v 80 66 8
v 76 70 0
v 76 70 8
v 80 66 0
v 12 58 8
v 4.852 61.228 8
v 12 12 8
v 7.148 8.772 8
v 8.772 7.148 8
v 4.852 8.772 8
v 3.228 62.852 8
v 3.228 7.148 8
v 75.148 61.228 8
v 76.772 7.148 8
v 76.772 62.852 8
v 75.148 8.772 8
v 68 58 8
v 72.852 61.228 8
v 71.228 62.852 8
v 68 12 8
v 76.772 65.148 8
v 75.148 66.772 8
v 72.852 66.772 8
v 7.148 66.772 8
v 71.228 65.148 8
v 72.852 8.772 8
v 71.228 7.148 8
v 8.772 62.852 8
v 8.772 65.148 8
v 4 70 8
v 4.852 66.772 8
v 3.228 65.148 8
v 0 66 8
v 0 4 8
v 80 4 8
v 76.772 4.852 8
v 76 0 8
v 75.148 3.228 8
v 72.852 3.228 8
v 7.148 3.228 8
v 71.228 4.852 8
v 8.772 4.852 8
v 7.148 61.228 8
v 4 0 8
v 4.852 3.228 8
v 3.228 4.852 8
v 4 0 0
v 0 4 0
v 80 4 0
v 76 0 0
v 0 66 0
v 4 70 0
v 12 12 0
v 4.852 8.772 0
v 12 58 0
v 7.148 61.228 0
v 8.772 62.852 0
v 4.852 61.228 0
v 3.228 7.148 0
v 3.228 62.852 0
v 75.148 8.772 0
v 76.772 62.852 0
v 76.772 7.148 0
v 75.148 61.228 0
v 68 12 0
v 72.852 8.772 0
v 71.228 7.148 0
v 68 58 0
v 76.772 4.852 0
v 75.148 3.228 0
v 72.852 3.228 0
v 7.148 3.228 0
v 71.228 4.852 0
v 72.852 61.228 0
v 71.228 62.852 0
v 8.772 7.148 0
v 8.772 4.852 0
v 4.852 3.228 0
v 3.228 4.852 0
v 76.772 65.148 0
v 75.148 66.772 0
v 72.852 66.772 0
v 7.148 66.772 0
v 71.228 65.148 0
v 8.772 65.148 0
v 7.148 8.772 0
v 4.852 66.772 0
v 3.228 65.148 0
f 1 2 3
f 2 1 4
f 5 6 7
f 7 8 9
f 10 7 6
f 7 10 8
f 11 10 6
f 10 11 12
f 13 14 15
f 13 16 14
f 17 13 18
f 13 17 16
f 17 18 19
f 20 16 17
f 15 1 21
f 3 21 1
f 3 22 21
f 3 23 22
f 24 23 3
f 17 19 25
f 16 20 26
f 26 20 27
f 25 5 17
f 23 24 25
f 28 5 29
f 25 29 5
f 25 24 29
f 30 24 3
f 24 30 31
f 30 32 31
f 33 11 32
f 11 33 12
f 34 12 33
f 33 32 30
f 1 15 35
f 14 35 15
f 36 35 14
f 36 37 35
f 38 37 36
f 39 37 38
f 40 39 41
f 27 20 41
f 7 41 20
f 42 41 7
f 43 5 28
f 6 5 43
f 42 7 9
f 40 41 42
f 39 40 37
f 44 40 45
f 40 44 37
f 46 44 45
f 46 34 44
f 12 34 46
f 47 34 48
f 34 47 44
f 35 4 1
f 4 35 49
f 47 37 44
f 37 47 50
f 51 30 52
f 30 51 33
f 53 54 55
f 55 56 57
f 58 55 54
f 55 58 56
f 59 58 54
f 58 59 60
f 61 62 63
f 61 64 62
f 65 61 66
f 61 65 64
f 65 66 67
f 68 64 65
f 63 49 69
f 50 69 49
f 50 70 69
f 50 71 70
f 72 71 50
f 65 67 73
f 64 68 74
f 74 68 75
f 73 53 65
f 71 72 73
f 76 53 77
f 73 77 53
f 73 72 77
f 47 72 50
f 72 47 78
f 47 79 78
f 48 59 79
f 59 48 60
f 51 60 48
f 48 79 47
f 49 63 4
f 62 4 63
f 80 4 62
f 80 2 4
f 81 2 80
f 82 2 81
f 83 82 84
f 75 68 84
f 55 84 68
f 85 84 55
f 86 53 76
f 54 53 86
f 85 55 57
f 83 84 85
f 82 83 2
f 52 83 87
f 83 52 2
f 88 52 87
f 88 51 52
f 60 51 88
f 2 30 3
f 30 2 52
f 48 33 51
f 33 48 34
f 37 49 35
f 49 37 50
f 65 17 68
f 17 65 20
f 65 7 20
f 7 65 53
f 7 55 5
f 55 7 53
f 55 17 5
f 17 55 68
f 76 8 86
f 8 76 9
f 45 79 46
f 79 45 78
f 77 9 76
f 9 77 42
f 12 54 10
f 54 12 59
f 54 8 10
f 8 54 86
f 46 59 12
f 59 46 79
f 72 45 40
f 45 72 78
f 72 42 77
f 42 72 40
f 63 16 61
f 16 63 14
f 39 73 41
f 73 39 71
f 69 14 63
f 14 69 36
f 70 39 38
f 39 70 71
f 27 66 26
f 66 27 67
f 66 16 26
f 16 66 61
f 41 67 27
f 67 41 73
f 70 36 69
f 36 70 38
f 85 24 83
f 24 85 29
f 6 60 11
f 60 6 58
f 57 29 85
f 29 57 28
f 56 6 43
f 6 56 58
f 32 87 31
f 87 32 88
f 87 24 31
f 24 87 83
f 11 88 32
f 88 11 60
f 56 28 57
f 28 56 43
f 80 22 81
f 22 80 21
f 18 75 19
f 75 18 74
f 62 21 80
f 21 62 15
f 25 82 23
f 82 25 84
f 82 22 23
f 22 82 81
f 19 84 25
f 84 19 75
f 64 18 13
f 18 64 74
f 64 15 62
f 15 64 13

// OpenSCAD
$fn = 32;

// ----------------------------------------------------------------------
// Frame plate: 80 x 70 frame, 12 mm rails
// ----------------------------------------------------------------------

// --- parameters (mm) ---
plate_l = 80;             // plate length, X
plate_w = 70;             // plate width, Y
plate_t = 8;              // plate thickness, Z (extrusion height)
corner_c = 4;             // corner chamfer
frame_bar = 12;           // frame rail width
bolt_r = 3;               // corner bolt window radius
bolt_inset = 6;           // bolt centre inset from the edges

win_l = plate_l - 2 * frame_bar;  // window length
win_w = plate_w - 2 * frame_bar;  // window width
bolt_d = 2 * bolt_r;  // corner hole diameter

profile = [[4, 0], [76, 0], [80, 4], [80, 66], [76, 70], [4, 70], [0, 66], [0, 4]];  // primary outline, 8 points, counter clockwise
void_1 = [[12, 12], [68, 12], [68, 58], [12, 58]];  // the window, 4 points
void_2 = [[8.772, 7.148], [7.148, 8.772], [4.852, 8.772], [3.228, 7.148], [3.228, 4.852], [4.852, 3.228], [7.148, 3.228], [8.772, 4.852]];  // corner bolt window, 8 points
void_3 = [[76.772, 7.148], [75.148, 8.772], [72.852, 8.772], [71.228, 7.148], [71.228, 4.852], [72.852, 3.228], [75.148, 3.228], [76.772, 4.852]];  // corner bolt window, 8 points
void_4 = [[8.772, 65.148], [7.148, 66.772], [4.852, 66.772], [3.228, 65.148], [3.228, 62.852], [4.852, 61.228], [7.148, 61.228], [8.772, 62.852]];  // corner bolt window, 8 points
void_5 = [[76.772, 65.148], [75.148, 66.772], [72.852, 66.772], [71.228, 65.148], [71.228, 62.852], [72.852, 61.228], [75.148, 61.228], [76.772, 62.852]];  // corner bolt window, 8 points

// --- the one profile operation ---
difference() {
  linear_extrude(height = plate_t) polygon(points = profile);
  translate([0, 0, -1])
    linear_extrude(height = plate_t + 2) polygon(points = void_1);
  translate([0, 0, -1])
    linear_extrude(height = plate_t + 2) polygon(points = void_2);
  translate([0, 0, -1])
    linear_extrude(height = plate_t + 2) polygon(points = void_3);
  translate([0, 0, -1])
    linear_extrude(height = plate_t + 2) polygon(points = void_4);
  translate([0, 0, -1])
    linear_extrude(height = plate_t + 2) polygon(points = void_5);
}
